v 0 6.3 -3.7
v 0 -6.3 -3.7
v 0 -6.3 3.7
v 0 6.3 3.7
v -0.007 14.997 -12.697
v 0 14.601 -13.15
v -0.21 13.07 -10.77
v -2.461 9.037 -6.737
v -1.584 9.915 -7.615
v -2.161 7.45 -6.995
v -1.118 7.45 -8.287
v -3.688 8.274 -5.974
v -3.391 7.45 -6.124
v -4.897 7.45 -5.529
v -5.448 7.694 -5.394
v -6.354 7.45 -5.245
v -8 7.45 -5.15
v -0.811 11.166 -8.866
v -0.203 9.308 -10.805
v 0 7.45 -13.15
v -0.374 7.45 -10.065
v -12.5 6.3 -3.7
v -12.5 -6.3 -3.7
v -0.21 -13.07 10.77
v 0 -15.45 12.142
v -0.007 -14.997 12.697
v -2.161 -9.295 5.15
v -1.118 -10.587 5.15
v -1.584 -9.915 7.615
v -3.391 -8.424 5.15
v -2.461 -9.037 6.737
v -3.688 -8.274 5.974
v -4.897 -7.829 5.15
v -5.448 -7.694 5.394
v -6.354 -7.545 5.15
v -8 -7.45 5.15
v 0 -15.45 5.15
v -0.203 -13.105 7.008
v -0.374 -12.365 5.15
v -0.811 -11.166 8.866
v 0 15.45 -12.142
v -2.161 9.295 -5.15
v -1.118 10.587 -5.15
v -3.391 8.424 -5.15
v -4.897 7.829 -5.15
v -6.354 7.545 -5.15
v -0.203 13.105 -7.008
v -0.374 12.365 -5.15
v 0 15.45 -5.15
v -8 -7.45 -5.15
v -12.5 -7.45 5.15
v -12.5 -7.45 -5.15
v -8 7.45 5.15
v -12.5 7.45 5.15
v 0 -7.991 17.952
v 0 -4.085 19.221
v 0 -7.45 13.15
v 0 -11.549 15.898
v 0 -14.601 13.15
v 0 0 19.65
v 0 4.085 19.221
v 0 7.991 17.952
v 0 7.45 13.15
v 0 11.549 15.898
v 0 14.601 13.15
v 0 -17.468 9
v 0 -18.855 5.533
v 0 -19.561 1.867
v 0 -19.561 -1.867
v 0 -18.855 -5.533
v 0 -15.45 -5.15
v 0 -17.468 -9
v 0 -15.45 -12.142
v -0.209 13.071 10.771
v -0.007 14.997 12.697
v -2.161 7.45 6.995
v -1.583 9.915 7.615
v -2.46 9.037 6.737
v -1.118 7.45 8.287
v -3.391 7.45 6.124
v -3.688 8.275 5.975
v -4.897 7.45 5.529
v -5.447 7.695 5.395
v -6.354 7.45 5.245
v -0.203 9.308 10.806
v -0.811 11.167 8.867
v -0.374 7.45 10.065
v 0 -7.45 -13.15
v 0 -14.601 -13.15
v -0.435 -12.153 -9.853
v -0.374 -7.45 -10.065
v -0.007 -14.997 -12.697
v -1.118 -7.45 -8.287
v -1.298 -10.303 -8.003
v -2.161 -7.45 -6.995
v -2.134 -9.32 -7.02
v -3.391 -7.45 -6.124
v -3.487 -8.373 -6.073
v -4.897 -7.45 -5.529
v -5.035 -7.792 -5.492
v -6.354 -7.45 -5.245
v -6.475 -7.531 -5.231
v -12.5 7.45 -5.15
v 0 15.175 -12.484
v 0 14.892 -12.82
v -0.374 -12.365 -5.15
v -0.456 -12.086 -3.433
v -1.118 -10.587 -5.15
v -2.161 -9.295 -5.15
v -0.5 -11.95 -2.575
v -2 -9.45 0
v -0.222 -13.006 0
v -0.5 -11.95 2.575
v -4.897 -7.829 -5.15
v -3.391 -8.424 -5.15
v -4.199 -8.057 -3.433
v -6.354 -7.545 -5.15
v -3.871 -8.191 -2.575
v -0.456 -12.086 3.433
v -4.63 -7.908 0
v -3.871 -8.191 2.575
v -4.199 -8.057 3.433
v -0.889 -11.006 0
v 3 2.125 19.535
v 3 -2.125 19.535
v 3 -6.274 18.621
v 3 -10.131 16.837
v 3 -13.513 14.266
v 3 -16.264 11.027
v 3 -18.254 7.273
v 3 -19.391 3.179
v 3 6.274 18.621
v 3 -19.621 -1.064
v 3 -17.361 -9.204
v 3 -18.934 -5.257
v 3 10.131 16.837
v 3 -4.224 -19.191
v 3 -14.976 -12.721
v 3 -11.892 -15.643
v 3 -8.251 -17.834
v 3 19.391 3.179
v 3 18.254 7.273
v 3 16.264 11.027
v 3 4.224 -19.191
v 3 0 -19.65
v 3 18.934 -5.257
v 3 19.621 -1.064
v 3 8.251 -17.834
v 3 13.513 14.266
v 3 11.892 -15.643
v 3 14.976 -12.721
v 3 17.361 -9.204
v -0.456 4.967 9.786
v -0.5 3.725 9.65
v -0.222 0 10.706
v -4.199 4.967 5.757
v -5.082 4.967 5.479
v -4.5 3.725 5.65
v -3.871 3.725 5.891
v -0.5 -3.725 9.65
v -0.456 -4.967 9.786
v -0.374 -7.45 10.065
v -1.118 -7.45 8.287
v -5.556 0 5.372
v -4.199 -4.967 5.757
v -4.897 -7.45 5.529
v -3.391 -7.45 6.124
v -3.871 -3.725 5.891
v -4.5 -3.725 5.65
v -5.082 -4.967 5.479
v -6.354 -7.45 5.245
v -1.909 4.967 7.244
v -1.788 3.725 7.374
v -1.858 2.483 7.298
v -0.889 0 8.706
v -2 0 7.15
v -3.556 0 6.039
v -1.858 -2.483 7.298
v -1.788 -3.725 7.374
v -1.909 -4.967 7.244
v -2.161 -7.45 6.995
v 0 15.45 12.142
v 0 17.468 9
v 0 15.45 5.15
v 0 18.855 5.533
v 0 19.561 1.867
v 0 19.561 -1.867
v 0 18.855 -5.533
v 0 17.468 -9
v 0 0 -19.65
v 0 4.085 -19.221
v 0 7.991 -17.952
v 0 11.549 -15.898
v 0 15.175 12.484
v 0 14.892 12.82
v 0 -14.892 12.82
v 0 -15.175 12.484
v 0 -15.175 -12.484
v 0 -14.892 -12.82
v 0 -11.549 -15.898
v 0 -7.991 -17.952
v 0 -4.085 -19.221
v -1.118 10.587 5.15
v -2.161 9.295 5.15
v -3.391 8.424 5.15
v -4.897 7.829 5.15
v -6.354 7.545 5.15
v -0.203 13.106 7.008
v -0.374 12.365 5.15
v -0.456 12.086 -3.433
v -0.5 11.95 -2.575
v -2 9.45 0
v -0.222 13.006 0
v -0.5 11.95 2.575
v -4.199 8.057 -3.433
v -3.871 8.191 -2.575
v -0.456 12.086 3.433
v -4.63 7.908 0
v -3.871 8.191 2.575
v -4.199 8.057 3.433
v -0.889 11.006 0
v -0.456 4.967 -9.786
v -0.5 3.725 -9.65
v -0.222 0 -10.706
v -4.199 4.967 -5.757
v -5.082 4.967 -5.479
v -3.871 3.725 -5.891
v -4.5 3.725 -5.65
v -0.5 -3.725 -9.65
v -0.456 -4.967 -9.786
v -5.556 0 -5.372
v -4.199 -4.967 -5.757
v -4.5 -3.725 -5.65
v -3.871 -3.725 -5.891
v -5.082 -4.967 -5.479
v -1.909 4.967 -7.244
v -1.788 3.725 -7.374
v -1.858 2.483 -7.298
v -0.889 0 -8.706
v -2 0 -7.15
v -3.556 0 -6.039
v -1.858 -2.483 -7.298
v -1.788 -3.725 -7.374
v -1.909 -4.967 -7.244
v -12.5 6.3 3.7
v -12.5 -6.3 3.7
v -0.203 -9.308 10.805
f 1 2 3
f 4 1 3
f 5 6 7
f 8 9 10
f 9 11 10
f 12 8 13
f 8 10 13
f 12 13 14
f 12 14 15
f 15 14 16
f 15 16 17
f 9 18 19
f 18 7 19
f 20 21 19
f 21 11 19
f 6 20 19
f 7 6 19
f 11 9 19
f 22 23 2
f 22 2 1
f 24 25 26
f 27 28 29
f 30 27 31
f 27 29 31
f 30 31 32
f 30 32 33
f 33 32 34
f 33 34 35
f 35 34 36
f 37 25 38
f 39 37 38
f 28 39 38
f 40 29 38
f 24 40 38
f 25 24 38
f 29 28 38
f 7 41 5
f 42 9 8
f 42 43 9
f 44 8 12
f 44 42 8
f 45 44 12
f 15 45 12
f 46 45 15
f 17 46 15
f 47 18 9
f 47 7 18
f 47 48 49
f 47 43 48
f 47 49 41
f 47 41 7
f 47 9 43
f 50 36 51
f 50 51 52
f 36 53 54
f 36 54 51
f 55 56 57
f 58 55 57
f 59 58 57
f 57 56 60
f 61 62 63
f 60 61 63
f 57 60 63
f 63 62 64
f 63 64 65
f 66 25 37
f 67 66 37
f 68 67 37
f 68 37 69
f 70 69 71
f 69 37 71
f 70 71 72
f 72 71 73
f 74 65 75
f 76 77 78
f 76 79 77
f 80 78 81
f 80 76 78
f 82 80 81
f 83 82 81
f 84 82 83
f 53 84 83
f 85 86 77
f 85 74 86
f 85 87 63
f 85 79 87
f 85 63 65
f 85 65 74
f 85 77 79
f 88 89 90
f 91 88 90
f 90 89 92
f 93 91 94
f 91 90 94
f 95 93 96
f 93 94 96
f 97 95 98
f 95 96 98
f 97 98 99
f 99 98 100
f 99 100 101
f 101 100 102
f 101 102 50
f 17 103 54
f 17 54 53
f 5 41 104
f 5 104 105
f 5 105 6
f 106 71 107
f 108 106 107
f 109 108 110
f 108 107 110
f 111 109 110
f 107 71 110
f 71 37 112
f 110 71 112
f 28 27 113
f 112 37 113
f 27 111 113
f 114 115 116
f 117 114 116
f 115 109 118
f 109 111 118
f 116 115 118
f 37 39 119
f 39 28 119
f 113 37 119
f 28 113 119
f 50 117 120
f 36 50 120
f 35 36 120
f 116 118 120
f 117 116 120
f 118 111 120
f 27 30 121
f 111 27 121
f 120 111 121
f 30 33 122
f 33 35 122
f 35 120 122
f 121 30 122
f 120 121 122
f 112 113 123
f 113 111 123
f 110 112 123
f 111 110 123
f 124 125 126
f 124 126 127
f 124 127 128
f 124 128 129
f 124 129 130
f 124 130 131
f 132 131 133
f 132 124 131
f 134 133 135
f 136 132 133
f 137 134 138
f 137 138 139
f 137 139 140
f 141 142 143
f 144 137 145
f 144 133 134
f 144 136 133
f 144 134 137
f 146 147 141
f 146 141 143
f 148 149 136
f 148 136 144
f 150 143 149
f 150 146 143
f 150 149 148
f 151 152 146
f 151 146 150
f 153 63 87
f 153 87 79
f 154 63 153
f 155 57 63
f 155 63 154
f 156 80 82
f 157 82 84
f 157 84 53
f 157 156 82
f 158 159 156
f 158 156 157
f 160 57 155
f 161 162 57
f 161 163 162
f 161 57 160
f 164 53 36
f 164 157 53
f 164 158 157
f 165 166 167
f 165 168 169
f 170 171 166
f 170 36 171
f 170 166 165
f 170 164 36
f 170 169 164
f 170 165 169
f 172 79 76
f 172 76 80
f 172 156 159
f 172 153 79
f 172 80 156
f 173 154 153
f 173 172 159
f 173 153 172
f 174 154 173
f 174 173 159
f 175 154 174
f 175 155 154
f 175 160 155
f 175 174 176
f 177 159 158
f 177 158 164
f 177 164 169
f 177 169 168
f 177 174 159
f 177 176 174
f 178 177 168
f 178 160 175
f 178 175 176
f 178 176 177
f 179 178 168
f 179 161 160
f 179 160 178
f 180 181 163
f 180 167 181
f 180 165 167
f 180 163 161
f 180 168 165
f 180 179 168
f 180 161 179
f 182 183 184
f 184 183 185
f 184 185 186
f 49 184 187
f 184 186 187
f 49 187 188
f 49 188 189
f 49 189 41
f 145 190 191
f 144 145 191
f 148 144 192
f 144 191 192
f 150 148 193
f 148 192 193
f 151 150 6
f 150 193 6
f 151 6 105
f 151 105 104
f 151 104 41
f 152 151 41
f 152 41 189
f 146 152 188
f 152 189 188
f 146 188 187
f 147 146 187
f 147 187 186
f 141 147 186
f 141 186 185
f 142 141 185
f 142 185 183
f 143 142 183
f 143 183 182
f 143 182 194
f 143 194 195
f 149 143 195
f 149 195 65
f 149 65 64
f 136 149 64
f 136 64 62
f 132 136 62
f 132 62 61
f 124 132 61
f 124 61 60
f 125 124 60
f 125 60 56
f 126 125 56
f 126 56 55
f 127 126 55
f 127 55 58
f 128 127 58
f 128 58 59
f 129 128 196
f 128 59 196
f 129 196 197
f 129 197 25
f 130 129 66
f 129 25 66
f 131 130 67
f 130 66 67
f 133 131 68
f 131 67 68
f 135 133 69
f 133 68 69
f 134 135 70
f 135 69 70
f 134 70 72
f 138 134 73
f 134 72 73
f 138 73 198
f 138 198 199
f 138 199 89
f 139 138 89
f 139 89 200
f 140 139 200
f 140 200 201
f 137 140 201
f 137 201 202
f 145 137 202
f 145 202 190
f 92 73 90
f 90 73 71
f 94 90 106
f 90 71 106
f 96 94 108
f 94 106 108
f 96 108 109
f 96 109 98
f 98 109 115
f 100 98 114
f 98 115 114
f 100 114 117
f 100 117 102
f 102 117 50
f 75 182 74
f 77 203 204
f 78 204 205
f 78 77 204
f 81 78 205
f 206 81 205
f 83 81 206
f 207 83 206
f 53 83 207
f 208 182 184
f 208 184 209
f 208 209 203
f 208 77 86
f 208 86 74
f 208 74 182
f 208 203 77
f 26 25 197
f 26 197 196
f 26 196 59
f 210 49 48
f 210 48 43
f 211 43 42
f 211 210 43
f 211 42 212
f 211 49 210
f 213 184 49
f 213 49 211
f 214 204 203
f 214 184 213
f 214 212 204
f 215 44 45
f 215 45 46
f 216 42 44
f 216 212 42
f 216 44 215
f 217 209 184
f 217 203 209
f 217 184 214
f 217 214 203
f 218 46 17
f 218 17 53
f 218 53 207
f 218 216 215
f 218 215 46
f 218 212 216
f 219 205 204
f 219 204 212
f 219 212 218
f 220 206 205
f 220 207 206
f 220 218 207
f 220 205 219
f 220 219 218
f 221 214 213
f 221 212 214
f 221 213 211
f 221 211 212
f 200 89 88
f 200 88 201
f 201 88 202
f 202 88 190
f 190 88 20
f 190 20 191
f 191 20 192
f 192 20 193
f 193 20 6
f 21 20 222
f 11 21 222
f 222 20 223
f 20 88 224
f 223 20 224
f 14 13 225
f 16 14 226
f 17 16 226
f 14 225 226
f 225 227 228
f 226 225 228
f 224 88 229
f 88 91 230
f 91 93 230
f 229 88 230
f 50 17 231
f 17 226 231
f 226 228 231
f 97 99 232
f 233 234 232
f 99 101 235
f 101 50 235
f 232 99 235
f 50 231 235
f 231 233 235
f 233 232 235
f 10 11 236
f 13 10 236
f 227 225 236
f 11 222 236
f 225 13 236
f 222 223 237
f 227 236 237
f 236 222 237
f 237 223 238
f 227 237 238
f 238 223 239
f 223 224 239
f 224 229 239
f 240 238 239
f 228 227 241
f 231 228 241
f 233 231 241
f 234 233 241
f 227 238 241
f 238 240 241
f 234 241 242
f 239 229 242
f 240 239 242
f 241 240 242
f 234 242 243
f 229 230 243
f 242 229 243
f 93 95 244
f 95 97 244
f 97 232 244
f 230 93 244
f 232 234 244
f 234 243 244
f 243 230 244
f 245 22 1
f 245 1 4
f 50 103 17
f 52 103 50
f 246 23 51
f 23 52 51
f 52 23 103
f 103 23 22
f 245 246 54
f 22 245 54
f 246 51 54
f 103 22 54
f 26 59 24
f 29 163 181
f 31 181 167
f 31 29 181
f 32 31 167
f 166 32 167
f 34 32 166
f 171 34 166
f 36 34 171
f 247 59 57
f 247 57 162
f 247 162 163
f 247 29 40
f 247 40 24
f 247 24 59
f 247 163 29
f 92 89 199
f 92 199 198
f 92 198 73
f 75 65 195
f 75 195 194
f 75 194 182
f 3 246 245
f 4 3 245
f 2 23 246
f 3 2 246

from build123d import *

# Parameters (mm, degrees)
SKETCH2_R           = 19.65
BOSS_EXTRUDE1_DEPTH = 3
SKETCH3_W           = 12.5
SKETCH3_H           = 14.9
BOSS_EXTRUDE2_DEPTH = 5.15
SKETCH4_W           = 7.4
SKETCH4_H           = 12.6
CUT_EXTRUDE1_DEPTH  = 12.5
FILLET1_SIZE        = 8


with BuildPart() as part:
    # Sketch2 → Boss-Extrude1 (new body)
    with BuildSketch(Plane(origin=(0, 0, 0), x_dir=(0, 0, -1), z_dir=(1, 0, 0))):
        Circle(SKETCH2_R)
    extrude(amount=BOSS_EXTRUDE1_DEPTH)

    # Sketch3 → Boss-Extrude2 (add, symmetric)
    with BuildSketch(Plane.XY):
        with Locations((-6.25, 0)):
            Rectangle(SKETCH3_W, SKETCH3_H)
    extrude(amount=BOSS_EXTRUDE2_DEPTH, both=True)

    # Sketch4 → Cut-Extrude1 (cut)
    with BuildSketch(Plane.ZY.offset(12.5)):
        Rectangle(SKETCH4_W, SKETCH4_H)
    extrude(amount=-CUT_EXTRUDE1_DEPTH, mode=Mode.SUBTRACT)

    # Fillet1
    # a fillet whose section is not a circle: 8 mm, written as the material it adds along each edge
    with BuildSketch(Plane(origin=(0, 7.45, 5.15), x_dir=(0, 1, 0), z_dir=(0, 0, -1))) as fillet1_piece_1:
        with BuildLine():
            Bezier((FILLET1_SIZE, 0), (0, 0), (0, -FILLET1_SIZE), weights=[1, 1, 1])
            Line((0, -FILLET1_SIZE), (0, 0))
            Line((0, 0), (FILLET1_SIZE, 0))
        make_face()
    extrude(amount=10.3)
    with BuildSketch(Plane(origin=(0, -7.45, 5.15), x_dir=(0, 0, 1), z_dir=(0, 1, 0))) as fillet1_piece_2:
        with BuildLine():
            Bezier((FILLET1_SIZE, 0), (0, 0), (0, -FILLET1_SIZE), weights=[1, 1, 1])
            Line((0, -FILLET1_SIZE), (0, 0))
            Line((0, 0), (FILLET1_SIZE, 0))
        make_face()
    extrude(amount=14.9)
    with BuildSketch(Plane(origin=(0, -7.45, 5.15), x_dir=(0, -1, 0), z_dir=(0, 0, -1))) as fillet1_piece_3:
        with BuildLine():
            Bezier((FILLET1_SIZE, 0), (0, 0), (0, FILLET1_SIZE), weights=[1, 1, 1])
            Line((0, FILLET1_SIZE), (0, 0))
            Line((0, 0), (FILLET1_SIZE, 0))
        make_face()
    extrude(amount=10.3)
    with BuildSketch(Plane(origin=(0, -7.45, -5.15), x_dir=(0, 0, -1), z_dir=(0, 1, 0))) as fillet1_piece_4:
        with BuildLine():
            Bezier((FILLET1_SIZE, 0), (0, 0), (0, FILLET1_SIZE), weights=[1, 1, 1])
            Line((0, FILLET1_SIZE), (0, 0))
            Line((0, 0), (FILLET1_SIZE, 0))
        make_face()
    extrude(amount=14.9)
    with BuildSketch(Plane(origin=(0, -7.45, 5.15), x_dir=(0, 0, 1), z_dir=(0, 1, 0))) as fillet1_piece_5a_section:
        with BuildLine():
            Bezier((FILLET1_SIZE, 0), (0, 0), (0, -FILLET1_SIZE), weights=[1, 1, 1])
            Line((0, -FILLET1_SIZE), (0, 0))
            Line((0, 0), (FILLET1_SIZE, 0))
        make_face()
    fillet1_piece_5a = extrude(amount=34.9, mode=Mode.PRIVATE)
    fillet1_piece_5a = fillet1_piece_5a & Plane(origin=(0, 0, 0), x_dir=(0, 0, -1), z_dir=(-1, 0, 0)) * Cylinder(19.65, 102, mode=Mode.PRIVATE)
    fillet1_piece_5a = split(fillet1_piece_5a, bisect_by=Plane(origin=(0, 7.45, 5.15), z_dir=(0, 1, 0)), keep=Keep.TOP, mode=Mode.PRIVATE)
    with BuildSketch(Plane(origin=(0, 7.45, 25.15), x_dir=(0, 1, 0), z_dir=(0, 0, -1))) as fillet1_piece_5b_section:
        with BuildLine():
            Bezier((FILLET1_SIZE, 0), (0, 0), (0, -FILLET1_SIZE), weights=[1, 1, 1])
            Line((0, -FILLET1_SIZE), (0, 0))
            Line((0, 0), (FILLET1_SIZE, 0))
        make_face()
    fillet1_piece_5b = extrude(amount=30.3, mode=Mode.PRIVATE)
    fillet1_piece_5b = fillet1_piece_5b & Plane(origin=(0, 0, 0), x_dir=(0, 0, -1), z_dir=(-1, 0, 0)) * Cylinder(19.65, 93, mode=Mode.PRIVATE)
    fillet1_piece_5b = split(fillet1_piece_5b, bisect_by=Plane(origin=(0, 7.45, 5.15), z_dir=(0, 0, 1)), keep=Keep.TOP, mode=Mode.PRIVATE)
    fillet1_piece_5 = fillet1_piece_5a & fillet1_piece_5b
    add(fillet1_piece_5)
    with BuildSketch(Plane(origin=(0, -7.45, -5.15), x_dir=(0, 0, -1), z_dir=(0, 1, 0))) as fillet1_piece_6a_section:
        with BuildLine():
            Bezier((FILLET1_SIZE, 0), (0, 0), (0, FILLET1_SIZE), weights=[1, 1, 1])
            Line((0, FILLET1_SIZE), (0, 0))
            Line((0, 0), (FILLET1_SIZE, 0))
        make_face()
    fillet1_piece_6a = extrude(amount=34.9, mode=Mode.PRIVATE)
    fillet1_piece_6a = fillet1_piece_6a & Plane(origin=(0, 0, 0), x_dir=(0, 0, -1), z_dir=(-1, 0, 0)) * Cylinder(19.65, 102, mode=Mode.PRIVATE)
    fillet1_piece_6a = split(fillet1_piece_6a, bisect_by=Plane(origin=(0, 7.45, -5.15), z_dir=(0, 1, 0)), keep=Keep.TOP, mode=Mode.PRIVATE)
    with BuildSketch(Plane(origin=(0, 7.45, 5.15), x_dir=(0, 1, 0), z_dir=(0, 0, -1))) as fillet1_piece_6b_section:
        with BuildLine():
            Bezier((FILLET1_SIZE, 0), (0, 0), (0, -FILLET1_SIZE), weights=[1, 1, 1])
            Line((0, -FILLET1_SIZE), (0, 0))
            Line((0, 0), (FILLET1_SIZE, 0))
        make_face()
    fillet1_piece_6b = extrude(amount=30.3, mode=Mode.PRIVATE)
    fillet1_piece_6b = fillet1_piece_6b & Plane(origin=(0, 0, 0), x_dir=(0, 0, -1), z_dir=(-1, 0, 0)) * Cylinder(19.65, 93, mode=Mode.PRIVATE)
    fillet1_piece_6b = split(fillet1_piece_6b, bisect_by=Plane(origin=(0, 7.45, -5.15), z_dir=(0, 0, -1)), keep=Keep.TOP, mode=Mode.PRIVATE)
    fillet1_piece_6 = fillet1_piece_6a & fillet1_piece_6b
    add(fillet1_piece_6)
    with BuildSketch(Plane(origin=(0, -27.45, 5.15), x_dir=(0, 0, 1), z_dir=(0, 1, 0))) as fillet1_piece_7a_section:
        with BuildLine():
            Bezier((FILLET1_SIZE, 0), (0, 0), (0, -FILLET1_SIZE), weights=[1, 1, 1])
            Line((0, -FILLET1_SIZE), (0, 0))
            Line((0, 0), (FILLET1_SIZE, 0))
        make_face()
    fillet1_piece_7a = extrude(amount=34.9, mode=Mode.PRIVATE)
    fillet1_piece_7a = fillet1_piece_7a & Plane(origin=(0, 0, 0), x_dir=(0, 0, -1), z_dir=(-1, 0, 0)) * Cylinder(19.65, 102, mode=Mode.PRIVATE)
    fillet1_piece_7a = split(fillet1_piece_7a, bisect_by=Plane(origin=(0, -7.45, 5.15), z_dir=(0, -1, 0)), keep=Keep.TOP, mode=Mode.PRIVATE)
    with BuildSketch(Plane(origin=(0, -7.45, 25.15), x_dir=(0, -1, 0), z_dir=(0, 0, -1))) as fillet1_piece_7b_section:
        with BuildLine():
            Bezier((FILLET1_SIZE, 0), (0, 0), (0, FILLET1_SIZE), weights=[1, 1, 1])
            Line((0, FILLET1_SIZE), (0, 0))
            Line((0, 0), (FILLET1_SIZE, 0))
        make_face()
    fillet1_piece_7b = extrude(amount=30.3, mode=Mode.PRIVATE)
    fillet1_piece_7b = fillet1_piece_7b & Plane(origin=(0, 0, 0), x_dir=(0, 0, -1), z_dir=(-1, 0, 0)) * Cylinder(19.65, 93, mode=Mode.PRIVATE)
    fillet1_piece_7b = split(fillet1_piece_7b, bisect_by=Plane(origin=(0, -7.45, 5.15), z_dir=(0, 0, 1)), keep=Keep.TOP, mode=Mode.PRIVATE)
    fillet1_piece_7 = fillet1_piece_7a & fillet1_piece_7b
    add(fillet1_piece_7)
    with BuildSketch(Plane(origin=(0, -7.45, 5.15), x_dir=(0, -1, 0), z_dir=(0, 0, -1))) as fillet1_piece_8a_section:
        with BuildLine():
            Bezier((FILLET1_SIZE, 0), (0, 0), (0, FILLET1_SIZE), weights=[1, 1, 1])
            Line((0, FILLET1_SIZE), (0, 0))
            Line((0, 0), (FILLET1_SIZE, 0))
        make_face()
    fillet1_piece_8a = extrude(amount=30.3, mode=Mode.PRIVATE)
    fillet1_piece_8a = fillet1_piece_8a & Plane(origin=(0, 0, 0), x_dir=(0, 0, -1), z_dir=(-1, 0, 0)) * Cylinder(19.65, 93, mode=Mode.PRIVATE)
    fillet1_piece_8a = split(fillet1_piece_8a, bisect_by=Plane(origin=(0, -7.45, -5.15), z_dir=(0, 0, -1)), keep=Keep.TOP, mode=Mode.PRIVATE)
    with BuildSketch(Plane(origin=(0, -27.45, -5.15), x_dir=(0, 0, -1), z_dir=(0, 1, 0))) as fillet1_piece_8b_section:
        with BuildLine():
            Bezier((FILLET1_SIZE, 0), (0, 0), (0, FILLET1_SIZE), weights=[1, 1, 1])
            Line((0, FILLET1_SIZE), (0, 0))
            Line((0, 0), (FILLET1_SIZE, 0))
        make_face()
    fillet1_piece_8b = extrude(amount=34.9, mode=Mode.PRIVATE)
    fillet1_piece_8b = fillet1_piece_8b & Plane(origin=(0, 0, 0), x_dir=(0, 0, -1), z_dir=(-1, 0, 0)) * Cylinder(19.65, 102, mode=Mode.PRIVATE)
    fillet1_piece_8b = split(fillet1_piece_8b, bisect_by=Plane(origin=(0, -7.45, -5.15), z_dir=(0, -1, 0)), keep=Keep.TOP, mode=Mode.PRIVATE)
    fillet1_piece_8 = fillet1_piece_8a & fillet1_piece_8b
    add(fillet1_piece_8)


solid = part.part
